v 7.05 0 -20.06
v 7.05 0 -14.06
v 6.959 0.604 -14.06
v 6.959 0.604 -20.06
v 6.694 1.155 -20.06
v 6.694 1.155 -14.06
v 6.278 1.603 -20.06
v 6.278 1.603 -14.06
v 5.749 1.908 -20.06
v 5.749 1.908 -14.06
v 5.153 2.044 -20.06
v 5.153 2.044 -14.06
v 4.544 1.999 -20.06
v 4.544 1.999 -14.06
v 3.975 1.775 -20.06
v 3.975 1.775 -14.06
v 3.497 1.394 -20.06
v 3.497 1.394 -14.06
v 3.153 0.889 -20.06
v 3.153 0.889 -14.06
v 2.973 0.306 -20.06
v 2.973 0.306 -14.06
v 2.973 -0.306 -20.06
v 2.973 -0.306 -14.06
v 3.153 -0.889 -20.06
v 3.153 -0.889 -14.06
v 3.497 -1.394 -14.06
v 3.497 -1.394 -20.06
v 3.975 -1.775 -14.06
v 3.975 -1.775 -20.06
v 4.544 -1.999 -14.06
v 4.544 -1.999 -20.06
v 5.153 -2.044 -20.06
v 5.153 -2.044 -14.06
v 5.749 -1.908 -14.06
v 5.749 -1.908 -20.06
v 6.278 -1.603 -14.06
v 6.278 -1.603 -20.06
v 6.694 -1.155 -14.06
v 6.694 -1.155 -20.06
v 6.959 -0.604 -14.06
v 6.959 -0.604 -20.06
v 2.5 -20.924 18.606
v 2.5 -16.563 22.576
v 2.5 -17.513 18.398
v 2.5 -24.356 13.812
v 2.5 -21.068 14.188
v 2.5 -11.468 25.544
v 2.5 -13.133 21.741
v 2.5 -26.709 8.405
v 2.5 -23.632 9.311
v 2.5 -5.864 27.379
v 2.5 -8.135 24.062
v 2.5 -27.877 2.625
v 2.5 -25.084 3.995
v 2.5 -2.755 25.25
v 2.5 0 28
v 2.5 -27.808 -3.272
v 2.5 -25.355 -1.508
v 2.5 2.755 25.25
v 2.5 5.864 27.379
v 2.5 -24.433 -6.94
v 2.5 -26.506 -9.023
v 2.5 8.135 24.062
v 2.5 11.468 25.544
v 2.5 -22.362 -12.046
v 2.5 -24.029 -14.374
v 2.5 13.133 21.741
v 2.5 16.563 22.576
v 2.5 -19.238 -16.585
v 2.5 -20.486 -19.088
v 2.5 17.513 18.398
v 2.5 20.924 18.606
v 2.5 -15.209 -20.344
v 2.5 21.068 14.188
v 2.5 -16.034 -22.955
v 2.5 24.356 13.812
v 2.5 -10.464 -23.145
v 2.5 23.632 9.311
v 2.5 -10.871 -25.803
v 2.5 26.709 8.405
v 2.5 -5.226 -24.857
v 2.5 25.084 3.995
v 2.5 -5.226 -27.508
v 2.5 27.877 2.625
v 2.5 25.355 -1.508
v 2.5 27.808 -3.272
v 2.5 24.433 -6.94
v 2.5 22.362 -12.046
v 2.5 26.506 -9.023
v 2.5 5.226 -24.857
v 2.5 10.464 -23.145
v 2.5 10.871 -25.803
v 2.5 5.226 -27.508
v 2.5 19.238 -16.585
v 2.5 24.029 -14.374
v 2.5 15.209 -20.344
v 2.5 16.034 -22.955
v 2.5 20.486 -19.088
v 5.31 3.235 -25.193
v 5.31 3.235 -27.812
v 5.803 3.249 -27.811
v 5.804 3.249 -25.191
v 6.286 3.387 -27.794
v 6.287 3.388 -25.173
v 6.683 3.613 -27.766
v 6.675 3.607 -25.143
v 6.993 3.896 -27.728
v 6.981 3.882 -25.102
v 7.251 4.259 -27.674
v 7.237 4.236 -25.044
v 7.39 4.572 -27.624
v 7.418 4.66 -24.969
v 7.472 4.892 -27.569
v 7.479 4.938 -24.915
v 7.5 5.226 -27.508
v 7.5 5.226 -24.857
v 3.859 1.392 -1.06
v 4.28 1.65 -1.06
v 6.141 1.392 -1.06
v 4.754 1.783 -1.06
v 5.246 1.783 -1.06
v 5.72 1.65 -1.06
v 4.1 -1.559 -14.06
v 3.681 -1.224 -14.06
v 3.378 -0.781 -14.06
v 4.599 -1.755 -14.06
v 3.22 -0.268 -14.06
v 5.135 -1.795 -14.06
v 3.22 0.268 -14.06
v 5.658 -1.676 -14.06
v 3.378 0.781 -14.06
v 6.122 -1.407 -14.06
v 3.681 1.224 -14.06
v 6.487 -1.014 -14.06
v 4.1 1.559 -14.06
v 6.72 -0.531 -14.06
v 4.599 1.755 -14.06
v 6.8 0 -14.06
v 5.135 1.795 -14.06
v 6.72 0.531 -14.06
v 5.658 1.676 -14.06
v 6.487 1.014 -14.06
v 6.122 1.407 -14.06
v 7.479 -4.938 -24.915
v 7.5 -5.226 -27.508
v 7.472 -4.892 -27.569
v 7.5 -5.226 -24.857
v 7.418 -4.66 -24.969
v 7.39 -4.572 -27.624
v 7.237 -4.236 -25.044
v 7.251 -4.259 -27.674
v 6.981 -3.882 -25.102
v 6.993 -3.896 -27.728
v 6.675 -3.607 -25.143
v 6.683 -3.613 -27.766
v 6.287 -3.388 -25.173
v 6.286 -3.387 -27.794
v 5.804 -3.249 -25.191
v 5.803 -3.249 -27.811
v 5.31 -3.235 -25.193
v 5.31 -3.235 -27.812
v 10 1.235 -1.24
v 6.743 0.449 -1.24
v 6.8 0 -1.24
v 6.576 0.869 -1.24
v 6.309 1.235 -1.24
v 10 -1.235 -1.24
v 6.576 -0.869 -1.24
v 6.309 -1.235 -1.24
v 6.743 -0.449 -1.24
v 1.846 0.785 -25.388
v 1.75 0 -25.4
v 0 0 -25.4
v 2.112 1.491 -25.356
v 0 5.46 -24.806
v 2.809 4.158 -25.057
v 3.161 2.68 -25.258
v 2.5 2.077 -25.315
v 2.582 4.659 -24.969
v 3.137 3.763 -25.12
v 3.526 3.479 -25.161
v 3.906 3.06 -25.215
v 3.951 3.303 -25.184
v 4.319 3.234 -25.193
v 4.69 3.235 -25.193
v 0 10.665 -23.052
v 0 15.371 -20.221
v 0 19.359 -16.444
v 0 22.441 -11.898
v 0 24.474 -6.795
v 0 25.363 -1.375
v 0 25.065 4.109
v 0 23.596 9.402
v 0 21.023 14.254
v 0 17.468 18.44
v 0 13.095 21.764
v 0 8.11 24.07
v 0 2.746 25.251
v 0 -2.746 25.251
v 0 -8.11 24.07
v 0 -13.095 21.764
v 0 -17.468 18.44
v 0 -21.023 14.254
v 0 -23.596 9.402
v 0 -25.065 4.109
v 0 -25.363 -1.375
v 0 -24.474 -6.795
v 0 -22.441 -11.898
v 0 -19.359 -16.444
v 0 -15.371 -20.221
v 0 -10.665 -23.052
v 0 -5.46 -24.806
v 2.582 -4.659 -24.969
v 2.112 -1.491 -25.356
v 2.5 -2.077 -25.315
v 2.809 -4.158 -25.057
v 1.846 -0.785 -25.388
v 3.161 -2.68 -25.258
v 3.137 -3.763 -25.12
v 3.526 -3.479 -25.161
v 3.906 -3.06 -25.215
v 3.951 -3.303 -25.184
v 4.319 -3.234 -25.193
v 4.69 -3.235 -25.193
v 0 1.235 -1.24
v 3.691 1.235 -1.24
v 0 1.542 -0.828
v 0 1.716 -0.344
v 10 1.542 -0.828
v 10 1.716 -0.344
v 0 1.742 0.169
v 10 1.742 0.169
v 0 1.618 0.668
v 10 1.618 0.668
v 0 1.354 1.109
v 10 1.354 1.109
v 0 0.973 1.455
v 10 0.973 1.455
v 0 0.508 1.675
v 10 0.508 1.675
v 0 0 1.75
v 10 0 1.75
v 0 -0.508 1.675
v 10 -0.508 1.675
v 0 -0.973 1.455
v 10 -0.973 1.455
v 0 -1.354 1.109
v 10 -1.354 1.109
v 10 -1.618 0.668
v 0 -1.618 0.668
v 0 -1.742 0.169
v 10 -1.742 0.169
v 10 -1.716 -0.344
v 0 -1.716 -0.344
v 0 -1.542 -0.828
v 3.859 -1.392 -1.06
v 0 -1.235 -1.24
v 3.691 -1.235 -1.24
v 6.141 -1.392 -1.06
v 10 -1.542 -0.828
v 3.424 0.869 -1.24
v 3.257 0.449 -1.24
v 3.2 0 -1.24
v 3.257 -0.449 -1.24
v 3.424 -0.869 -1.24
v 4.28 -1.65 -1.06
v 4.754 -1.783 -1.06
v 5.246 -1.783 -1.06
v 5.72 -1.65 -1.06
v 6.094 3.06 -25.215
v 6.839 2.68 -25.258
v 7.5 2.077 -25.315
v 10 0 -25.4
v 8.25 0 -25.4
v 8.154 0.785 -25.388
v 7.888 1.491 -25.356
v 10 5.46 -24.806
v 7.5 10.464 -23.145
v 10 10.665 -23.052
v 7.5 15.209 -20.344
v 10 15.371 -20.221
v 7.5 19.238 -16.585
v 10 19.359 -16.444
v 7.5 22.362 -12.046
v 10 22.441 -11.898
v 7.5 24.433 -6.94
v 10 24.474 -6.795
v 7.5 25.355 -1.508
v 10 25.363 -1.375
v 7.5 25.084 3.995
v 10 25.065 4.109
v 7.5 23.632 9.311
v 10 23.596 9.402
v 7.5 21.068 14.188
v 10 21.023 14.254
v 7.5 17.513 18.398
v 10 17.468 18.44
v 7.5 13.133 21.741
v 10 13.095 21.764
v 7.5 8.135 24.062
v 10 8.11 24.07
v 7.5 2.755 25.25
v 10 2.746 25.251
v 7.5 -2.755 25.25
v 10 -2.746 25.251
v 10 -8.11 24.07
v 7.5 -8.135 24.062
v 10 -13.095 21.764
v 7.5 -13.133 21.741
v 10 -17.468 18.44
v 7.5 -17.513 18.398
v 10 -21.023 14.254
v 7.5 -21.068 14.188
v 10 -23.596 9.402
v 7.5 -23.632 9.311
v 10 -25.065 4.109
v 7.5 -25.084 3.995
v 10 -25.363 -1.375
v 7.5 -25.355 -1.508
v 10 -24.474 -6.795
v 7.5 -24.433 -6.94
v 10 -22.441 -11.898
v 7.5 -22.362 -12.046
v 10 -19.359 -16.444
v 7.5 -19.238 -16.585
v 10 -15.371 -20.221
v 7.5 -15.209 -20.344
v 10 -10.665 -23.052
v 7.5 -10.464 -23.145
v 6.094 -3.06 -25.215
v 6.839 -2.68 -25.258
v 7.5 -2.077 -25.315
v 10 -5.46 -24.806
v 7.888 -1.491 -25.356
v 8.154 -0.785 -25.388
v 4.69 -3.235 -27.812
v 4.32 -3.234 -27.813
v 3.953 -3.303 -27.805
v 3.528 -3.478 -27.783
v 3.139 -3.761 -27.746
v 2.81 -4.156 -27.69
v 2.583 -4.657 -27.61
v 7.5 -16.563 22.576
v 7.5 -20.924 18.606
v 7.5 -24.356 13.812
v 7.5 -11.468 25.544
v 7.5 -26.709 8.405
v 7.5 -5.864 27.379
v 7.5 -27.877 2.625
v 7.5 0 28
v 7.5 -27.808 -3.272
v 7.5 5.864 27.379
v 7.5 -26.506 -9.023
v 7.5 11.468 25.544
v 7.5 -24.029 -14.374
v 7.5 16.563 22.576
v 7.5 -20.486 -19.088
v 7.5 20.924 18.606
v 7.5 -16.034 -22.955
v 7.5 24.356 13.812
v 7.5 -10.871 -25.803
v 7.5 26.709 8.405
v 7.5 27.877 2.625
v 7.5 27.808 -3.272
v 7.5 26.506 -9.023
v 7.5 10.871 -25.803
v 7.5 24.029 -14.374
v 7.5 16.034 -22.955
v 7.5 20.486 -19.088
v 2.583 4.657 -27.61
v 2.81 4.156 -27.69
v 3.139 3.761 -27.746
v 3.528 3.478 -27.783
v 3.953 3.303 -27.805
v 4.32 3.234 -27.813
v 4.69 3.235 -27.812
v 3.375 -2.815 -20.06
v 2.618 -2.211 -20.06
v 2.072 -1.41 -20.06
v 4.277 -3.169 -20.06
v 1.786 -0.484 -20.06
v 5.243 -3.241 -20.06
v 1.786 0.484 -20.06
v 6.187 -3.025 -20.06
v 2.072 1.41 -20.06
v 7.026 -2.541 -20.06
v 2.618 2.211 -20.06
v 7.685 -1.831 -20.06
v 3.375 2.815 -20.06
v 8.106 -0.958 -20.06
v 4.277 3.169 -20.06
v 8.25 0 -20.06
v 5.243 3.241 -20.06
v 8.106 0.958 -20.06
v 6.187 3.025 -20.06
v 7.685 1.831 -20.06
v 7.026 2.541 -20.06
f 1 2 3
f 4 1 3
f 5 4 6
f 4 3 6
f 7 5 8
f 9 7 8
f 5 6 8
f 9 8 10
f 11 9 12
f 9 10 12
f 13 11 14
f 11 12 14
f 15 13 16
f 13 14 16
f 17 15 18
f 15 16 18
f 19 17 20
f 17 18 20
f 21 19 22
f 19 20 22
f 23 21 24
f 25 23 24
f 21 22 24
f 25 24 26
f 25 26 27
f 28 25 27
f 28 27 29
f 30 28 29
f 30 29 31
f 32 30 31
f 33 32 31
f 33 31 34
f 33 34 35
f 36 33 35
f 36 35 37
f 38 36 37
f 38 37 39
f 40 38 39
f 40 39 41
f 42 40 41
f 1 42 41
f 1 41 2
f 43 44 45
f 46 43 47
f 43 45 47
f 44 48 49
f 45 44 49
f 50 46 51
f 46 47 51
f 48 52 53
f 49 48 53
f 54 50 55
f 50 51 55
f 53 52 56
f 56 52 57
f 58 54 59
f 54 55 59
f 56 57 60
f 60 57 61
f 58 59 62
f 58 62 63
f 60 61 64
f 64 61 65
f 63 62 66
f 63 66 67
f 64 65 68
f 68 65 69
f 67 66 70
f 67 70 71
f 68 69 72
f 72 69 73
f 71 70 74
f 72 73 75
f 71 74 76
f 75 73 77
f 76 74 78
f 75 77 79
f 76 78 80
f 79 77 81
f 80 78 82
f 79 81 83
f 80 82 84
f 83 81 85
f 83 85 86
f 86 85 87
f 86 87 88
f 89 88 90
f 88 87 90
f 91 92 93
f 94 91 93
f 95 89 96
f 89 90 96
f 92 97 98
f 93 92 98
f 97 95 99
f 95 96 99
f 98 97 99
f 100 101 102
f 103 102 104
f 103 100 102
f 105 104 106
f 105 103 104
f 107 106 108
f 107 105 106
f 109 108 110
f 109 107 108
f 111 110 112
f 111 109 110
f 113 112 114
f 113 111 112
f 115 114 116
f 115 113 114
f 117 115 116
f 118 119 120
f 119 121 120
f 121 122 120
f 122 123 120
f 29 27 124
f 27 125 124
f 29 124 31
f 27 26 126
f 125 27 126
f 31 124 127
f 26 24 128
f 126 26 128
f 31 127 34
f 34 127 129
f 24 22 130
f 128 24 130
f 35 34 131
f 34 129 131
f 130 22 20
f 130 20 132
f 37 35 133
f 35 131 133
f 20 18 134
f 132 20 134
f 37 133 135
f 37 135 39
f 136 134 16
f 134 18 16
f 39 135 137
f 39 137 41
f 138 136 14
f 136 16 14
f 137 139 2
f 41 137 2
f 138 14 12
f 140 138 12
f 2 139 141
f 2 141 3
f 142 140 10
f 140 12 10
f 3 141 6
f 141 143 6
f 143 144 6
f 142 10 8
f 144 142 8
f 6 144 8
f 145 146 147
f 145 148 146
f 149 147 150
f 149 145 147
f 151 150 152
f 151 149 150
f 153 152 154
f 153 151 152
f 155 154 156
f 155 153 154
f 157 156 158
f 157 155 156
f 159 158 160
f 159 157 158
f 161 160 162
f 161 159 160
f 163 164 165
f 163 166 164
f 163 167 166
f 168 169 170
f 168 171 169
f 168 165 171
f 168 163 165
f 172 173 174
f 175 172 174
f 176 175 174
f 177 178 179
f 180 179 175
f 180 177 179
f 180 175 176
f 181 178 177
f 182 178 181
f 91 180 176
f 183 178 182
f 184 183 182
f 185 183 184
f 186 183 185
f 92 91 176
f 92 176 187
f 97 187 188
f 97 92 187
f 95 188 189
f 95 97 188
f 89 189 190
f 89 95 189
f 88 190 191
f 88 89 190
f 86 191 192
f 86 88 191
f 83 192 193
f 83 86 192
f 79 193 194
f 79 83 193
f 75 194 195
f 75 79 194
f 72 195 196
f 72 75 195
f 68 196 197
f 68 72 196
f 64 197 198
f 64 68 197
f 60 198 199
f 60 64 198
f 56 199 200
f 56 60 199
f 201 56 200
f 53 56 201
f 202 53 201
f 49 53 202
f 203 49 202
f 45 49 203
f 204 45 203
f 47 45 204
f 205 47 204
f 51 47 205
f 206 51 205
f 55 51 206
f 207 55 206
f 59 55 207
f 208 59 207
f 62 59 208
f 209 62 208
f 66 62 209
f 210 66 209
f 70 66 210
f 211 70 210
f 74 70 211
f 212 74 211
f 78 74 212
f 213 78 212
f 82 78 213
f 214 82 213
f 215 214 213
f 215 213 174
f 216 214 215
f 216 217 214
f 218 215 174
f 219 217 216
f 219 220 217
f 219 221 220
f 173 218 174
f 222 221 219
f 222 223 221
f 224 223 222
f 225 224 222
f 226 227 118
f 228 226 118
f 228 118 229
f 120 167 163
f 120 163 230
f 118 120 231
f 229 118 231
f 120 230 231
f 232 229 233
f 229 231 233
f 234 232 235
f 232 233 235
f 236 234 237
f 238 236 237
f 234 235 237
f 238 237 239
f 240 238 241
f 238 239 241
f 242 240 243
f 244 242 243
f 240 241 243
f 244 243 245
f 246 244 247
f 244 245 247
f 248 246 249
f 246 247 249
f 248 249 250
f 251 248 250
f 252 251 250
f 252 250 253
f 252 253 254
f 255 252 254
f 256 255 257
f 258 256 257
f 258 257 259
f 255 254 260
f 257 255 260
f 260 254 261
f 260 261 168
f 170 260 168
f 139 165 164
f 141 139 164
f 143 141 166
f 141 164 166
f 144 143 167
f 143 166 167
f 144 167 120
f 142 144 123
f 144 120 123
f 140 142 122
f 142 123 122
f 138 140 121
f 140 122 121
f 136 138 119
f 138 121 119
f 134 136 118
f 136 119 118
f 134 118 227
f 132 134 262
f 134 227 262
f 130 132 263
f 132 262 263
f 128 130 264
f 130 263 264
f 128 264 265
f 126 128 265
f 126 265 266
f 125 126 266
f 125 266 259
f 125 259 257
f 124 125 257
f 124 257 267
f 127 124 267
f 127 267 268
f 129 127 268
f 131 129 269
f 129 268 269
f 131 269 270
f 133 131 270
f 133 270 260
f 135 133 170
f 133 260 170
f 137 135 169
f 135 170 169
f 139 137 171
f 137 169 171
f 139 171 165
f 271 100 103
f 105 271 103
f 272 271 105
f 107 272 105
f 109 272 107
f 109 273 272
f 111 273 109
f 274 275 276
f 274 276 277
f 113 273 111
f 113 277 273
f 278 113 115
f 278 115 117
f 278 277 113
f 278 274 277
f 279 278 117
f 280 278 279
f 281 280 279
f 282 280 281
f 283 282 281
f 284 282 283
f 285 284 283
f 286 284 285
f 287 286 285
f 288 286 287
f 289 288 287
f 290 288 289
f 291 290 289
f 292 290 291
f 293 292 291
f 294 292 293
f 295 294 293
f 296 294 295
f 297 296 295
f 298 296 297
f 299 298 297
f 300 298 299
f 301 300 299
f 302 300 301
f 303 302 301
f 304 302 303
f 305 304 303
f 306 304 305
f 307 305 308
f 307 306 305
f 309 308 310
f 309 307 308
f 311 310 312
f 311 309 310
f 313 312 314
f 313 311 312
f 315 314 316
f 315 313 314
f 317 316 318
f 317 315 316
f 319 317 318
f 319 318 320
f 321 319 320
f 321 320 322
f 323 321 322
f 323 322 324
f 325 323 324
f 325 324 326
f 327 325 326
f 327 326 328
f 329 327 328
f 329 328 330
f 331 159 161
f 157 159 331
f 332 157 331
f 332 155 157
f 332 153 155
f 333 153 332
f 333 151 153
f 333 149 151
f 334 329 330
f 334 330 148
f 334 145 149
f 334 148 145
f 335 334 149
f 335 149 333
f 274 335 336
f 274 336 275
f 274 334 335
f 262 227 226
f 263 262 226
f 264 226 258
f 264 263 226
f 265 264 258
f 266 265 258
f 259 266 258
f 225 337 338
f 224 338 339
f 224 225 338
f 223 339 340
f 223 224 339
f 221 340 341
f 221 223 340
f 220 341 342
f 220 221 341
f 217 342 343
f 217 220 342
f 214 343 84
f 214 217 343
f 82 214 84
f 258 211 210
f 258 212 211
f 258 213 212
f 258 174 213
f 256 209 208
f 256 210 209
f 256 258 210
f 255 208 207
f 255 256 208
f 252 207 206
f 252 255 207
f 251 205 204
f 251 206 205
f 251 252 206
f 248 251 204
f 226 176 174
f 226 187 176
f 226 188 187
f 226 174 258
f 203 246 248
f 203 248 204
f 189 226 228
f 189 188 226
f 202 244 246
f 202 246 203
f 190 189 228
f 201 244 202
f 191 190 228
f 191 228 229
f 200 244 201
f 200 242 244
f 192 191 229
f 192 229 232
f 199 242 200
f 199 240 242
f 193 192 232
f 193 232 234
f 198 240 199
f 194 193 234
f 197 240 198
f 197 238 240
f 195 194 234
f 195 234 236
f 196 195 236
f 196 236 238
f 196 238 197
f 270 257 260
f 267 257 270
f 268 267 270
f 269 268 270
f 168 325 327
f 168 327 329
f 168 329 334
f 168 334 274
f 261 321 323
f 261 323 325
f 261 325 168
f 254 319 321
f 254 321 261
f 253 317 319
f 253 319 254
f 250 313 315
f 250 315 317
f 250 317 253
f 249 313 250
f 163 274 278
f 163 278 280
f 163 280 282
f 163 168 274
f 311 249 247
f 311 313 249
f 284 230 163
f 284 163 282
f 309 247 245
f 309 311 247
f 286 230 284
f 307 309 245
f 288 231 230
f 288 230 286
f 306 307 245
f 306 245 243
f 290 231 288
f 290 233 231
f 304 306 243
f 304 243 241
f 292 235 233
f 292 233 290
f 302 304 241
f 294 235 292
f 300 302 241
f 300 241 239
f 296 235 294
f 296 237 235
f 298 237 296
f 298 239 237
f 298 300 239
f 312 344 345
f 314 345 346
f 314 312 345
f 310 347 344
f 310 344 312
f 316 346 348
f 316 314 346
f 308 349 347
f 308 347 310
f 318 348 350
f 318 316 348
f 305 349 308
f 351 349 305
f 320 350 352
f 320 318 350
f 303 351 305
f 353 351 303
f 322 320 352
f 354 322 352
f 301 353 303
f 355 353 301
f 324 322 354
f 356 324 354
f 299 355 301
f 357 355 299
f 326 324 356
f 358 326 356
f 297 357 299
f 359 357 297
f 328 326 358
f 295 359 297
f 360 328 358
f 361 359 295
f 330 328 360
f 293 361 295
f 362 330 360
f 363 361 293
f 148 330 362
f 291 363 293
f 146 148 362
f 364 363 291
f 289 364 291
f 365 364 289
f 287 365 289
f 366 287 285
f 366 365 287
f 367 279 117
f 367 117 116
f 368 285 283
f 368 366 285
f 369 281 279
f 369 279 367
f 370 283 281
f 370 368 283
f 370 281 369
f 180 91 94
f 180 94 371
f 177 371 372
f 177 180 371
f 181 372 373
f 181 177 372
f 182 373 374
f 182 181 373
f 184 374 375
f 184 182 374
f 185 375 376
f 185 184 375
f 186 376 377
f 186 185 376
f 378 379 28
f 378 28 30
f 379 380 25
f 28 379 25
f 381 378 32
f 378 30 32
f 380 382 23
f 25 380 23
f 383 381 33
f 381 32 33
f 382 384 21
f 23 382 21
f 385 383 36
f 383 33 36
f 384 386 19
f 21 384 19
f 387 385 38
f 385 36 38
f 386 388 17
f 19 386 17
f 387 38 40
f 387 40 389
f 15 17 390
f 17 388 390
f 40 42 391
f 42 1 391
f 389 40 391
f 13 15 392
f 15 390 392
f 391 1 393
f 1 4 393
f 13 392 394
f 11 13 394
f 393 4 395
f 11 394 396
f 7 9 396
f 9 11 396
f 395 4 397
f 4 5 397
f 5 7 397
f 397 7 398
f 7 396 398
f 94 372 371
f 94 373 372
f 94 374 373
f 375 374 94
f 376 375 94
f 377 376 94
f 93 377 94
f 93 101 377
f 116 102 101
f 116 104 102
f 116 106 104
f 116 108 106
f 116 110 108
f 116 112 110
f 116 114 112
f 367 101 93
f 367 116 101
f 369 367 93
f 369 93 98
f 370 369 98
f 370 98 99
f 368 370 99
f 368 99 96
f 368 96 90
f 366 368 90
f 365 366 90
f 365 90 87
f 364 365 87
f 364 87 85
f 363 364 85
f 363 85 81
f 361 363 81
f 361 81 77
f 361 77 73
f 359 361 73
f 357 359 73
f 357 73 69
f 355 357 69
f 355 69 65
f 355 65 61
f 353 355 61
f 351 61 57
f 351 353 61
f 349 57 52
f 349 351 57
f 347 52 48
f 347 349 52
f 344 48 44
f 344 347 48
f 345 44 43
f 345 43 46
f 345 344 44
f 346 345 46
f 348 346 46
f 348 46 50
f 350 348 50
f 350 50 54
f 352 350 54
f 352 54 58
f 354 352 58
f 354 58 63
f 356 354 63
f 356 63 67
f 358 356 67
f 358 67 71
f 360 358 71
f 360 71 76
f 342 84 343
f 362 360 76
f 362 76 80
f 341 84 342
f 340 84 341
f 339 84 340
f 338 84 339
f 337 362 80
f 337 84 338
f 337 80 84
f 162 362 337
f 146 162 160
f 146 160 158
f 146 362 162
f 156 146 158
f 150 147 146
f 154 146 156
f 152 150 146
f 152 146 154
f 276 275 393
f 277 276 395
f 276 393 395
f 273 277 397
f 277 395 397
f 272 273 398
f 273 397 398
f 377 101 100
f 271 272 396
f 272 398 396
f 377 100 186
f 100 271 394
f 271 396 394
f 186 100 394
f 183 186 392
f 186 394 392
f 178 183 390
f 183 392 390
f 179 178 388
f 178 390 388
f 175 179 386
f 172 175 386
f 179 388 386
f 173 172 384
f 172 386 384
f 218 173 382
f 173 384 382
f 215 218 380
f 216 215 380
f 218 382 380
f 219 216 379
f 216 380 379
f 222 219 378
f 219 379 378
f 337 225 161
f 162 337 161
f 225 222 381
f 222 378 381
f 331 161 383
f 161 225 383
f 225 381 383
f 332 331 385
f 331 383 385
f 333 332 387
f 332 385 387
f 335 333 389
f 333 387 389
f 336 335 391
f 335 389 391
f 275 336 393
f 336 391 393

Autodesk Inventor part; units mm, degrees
ref_plane "YZ Plane" through (0, 0, 0) normal (1, 0, 0) x (0, 1, 0)
ref_plane "XY Plane" through (0, 0, 0) normal (0, 0, 1) x (1, 0, 0)
sketch "Sketch1" plane through (0, 0, 0) normal (1, 0, 0) x (0, 1, 0)
  arc A0 (1.1581, -1.06) -> (-1.1581, -1.06) centre (0, 0) ccw
  line L0 (1.1581, -1.06) -> (-1.1581, -1.06)
  circle A1 centre (0, 0) radius 26.5
extrude "Extrusion1" add sketch "Sketch1" along normal blind 10
ref_plane "Work Plane1" through (0, 26.5, 0) normal (0, 1, 0) x (-1, 0, 0)
ref_plane "Work Plane2" through (0, -26.5, 0) normal (0, 1, 0) x (-1, 0, 0)
sketch "Sketch6" plane through (10, 0, 0) normal (1, 0, 0) x (0, 0, -1)
  arc A0 (26.4953, 0.5) -> (26.4953, -0.5) centre (0, 0) ccw projected
  line L0 (0, 26.5) -> (0, 27.25)
  arc A1 (26.4953, 0.5) -> (26.4953, -0.5) centre (0, 0) ccw
  circle A2 centre (0, 0) radius 26.5 projected
  circle A3 centre (0, 0) radius 26.5
  circle A4 centre (0, 0) radius 27.25
  dimension "d22" = 0.75
extrude "Extrusion6" add sketch "Sketch6" against normal blind 1
ref_plane "Work Plane3" through (5, 0, 0) normal (1, 0, 0) x (0, 0, -1)
mirror "Mirror1" about plane through (5, 0, 0) normal (1, 0, 0) of "Extrusion6"
sketch "Sketch7" plane through (0, -1.1581, -1.06) normal (0, 0, 1) x (1, 0, 0)
  line L0 (1, 27.6581) -> (9, 27.6581) projected
  line L1 (5, 27.6581) -> (5, -25.3419)
  line L2 (1, -25.3419) -> (9, -25.3419) projected
  line L3 (10, 2.3163) -> (10, 0) projected
  line L4 (10, 1.1581) -> (-0.1429, 1.1581)
  circle A0 centre (5, 1.1581) radius 1.8
  dimension "d28" = 3.6
extrude "Extrusion7" cut sketch "Sketch7" against normal blind 13
ref_plane "Work Plane4" through (10, -1.1581, -14.06) normal (0, 0, 1) x (1, 0, 0)
sketch "Sketch8" plane through (10, -1.1581, -14.06) normal (0, 0, 1) x (1, 0, 0)
  arc A0 (-6.3779, 0) -> (-3.6221, 0) centre (-5, 1.1581) ccw projected
  circle A1 centre (-5, 1.1581) radius 2.05
  point P0 (-10, 1.1581)
  dimension "d32" = 4.1
extrude "Extrusion8" cut sketch "Sketch8" against normal blind 6
ref_plane "Work Plane5" through (10, -1.1581, -20.06) normal (0, 0, 1) x (1, 0, 0)
sketch "Sketch10" plane through (10, 0, 0) normal (1, 0, 0) x (0, 0, -1)
  circle A0 centre (0, 0) radius 27.25 projected
  circle A1 centre (0, 0) radius 1.75
  line L0 (1.2405, 1.2351) -> (1.2405, -1.2351)
  arc A2 (1.2405, 1.2351) -> (1.2405, -1.2351) centre (0, 0) ccw
  point P0 (1.2405, -1.2344)
  point P1 (1.2405, 1.2344)
  dimension "d40" = 3.5
extrude "Extrusion10" cut sketch "Sketch10" against normal blind 15.575 contours L0 A1 picked at (0.3435, -0.5243)
sketch "Sketch11" plane through (10, 0, 0) normal (1, 0, 0) x (0, 0, -1)
  circle A0 centre (0, 0) radius 27.25 projected
  arc A1 (1.2405, 1.2344) -> (1.2405, -1.2344) centre (0, 0) ccw projected
  circle A2 centre (0, 0) radius 25.4
  dimension "d44" = 50.8
extrude "Extrusion11" cut sketch "Sketch11" against normal blind 10
sketch "Sketch12" plane through (5, 0, 0) normal (1, 0, 0) x (0, 0, -1)
  circle A0 centre (0, 0) radius 28
  circle A1 centre (0, 0) radius 25.4
  dimension "d45" = 56
extrude "Extrusion12" add sketch "Sketch12" along normal mid plane 5
sketch "Sketch9" plane through (10, -1.1581, -20.06) normal (0, 0, 1) x (1, 0, 0)
  circle A0 centre (-5, 1.1581) radius 1.8 projected
  circle A1 centre (-5, 1.1581) radius 4.3333
  circle A2 centre (-5, 1.1581) radius 2.05 projected
  circle A3 centre (-5, 1.1581) radius 3.25
  point P0 (-10, 1.1581)
  dimension "d41" = 6.5
extrude "Extrusion9" cut sketch "Sketch9" against normal blind 16.225 contours A0 | A2 | A3
fillet "Fillet1" radius 2 4 edges at (2.5, 2.0767, -26.6189) (2.5, -2.0767, -26.6189) (7.5, -2.0767, -26.6189) (7.5, 2.0767, -26.6189)
properties part number "Lock Wheel New Rubber"
